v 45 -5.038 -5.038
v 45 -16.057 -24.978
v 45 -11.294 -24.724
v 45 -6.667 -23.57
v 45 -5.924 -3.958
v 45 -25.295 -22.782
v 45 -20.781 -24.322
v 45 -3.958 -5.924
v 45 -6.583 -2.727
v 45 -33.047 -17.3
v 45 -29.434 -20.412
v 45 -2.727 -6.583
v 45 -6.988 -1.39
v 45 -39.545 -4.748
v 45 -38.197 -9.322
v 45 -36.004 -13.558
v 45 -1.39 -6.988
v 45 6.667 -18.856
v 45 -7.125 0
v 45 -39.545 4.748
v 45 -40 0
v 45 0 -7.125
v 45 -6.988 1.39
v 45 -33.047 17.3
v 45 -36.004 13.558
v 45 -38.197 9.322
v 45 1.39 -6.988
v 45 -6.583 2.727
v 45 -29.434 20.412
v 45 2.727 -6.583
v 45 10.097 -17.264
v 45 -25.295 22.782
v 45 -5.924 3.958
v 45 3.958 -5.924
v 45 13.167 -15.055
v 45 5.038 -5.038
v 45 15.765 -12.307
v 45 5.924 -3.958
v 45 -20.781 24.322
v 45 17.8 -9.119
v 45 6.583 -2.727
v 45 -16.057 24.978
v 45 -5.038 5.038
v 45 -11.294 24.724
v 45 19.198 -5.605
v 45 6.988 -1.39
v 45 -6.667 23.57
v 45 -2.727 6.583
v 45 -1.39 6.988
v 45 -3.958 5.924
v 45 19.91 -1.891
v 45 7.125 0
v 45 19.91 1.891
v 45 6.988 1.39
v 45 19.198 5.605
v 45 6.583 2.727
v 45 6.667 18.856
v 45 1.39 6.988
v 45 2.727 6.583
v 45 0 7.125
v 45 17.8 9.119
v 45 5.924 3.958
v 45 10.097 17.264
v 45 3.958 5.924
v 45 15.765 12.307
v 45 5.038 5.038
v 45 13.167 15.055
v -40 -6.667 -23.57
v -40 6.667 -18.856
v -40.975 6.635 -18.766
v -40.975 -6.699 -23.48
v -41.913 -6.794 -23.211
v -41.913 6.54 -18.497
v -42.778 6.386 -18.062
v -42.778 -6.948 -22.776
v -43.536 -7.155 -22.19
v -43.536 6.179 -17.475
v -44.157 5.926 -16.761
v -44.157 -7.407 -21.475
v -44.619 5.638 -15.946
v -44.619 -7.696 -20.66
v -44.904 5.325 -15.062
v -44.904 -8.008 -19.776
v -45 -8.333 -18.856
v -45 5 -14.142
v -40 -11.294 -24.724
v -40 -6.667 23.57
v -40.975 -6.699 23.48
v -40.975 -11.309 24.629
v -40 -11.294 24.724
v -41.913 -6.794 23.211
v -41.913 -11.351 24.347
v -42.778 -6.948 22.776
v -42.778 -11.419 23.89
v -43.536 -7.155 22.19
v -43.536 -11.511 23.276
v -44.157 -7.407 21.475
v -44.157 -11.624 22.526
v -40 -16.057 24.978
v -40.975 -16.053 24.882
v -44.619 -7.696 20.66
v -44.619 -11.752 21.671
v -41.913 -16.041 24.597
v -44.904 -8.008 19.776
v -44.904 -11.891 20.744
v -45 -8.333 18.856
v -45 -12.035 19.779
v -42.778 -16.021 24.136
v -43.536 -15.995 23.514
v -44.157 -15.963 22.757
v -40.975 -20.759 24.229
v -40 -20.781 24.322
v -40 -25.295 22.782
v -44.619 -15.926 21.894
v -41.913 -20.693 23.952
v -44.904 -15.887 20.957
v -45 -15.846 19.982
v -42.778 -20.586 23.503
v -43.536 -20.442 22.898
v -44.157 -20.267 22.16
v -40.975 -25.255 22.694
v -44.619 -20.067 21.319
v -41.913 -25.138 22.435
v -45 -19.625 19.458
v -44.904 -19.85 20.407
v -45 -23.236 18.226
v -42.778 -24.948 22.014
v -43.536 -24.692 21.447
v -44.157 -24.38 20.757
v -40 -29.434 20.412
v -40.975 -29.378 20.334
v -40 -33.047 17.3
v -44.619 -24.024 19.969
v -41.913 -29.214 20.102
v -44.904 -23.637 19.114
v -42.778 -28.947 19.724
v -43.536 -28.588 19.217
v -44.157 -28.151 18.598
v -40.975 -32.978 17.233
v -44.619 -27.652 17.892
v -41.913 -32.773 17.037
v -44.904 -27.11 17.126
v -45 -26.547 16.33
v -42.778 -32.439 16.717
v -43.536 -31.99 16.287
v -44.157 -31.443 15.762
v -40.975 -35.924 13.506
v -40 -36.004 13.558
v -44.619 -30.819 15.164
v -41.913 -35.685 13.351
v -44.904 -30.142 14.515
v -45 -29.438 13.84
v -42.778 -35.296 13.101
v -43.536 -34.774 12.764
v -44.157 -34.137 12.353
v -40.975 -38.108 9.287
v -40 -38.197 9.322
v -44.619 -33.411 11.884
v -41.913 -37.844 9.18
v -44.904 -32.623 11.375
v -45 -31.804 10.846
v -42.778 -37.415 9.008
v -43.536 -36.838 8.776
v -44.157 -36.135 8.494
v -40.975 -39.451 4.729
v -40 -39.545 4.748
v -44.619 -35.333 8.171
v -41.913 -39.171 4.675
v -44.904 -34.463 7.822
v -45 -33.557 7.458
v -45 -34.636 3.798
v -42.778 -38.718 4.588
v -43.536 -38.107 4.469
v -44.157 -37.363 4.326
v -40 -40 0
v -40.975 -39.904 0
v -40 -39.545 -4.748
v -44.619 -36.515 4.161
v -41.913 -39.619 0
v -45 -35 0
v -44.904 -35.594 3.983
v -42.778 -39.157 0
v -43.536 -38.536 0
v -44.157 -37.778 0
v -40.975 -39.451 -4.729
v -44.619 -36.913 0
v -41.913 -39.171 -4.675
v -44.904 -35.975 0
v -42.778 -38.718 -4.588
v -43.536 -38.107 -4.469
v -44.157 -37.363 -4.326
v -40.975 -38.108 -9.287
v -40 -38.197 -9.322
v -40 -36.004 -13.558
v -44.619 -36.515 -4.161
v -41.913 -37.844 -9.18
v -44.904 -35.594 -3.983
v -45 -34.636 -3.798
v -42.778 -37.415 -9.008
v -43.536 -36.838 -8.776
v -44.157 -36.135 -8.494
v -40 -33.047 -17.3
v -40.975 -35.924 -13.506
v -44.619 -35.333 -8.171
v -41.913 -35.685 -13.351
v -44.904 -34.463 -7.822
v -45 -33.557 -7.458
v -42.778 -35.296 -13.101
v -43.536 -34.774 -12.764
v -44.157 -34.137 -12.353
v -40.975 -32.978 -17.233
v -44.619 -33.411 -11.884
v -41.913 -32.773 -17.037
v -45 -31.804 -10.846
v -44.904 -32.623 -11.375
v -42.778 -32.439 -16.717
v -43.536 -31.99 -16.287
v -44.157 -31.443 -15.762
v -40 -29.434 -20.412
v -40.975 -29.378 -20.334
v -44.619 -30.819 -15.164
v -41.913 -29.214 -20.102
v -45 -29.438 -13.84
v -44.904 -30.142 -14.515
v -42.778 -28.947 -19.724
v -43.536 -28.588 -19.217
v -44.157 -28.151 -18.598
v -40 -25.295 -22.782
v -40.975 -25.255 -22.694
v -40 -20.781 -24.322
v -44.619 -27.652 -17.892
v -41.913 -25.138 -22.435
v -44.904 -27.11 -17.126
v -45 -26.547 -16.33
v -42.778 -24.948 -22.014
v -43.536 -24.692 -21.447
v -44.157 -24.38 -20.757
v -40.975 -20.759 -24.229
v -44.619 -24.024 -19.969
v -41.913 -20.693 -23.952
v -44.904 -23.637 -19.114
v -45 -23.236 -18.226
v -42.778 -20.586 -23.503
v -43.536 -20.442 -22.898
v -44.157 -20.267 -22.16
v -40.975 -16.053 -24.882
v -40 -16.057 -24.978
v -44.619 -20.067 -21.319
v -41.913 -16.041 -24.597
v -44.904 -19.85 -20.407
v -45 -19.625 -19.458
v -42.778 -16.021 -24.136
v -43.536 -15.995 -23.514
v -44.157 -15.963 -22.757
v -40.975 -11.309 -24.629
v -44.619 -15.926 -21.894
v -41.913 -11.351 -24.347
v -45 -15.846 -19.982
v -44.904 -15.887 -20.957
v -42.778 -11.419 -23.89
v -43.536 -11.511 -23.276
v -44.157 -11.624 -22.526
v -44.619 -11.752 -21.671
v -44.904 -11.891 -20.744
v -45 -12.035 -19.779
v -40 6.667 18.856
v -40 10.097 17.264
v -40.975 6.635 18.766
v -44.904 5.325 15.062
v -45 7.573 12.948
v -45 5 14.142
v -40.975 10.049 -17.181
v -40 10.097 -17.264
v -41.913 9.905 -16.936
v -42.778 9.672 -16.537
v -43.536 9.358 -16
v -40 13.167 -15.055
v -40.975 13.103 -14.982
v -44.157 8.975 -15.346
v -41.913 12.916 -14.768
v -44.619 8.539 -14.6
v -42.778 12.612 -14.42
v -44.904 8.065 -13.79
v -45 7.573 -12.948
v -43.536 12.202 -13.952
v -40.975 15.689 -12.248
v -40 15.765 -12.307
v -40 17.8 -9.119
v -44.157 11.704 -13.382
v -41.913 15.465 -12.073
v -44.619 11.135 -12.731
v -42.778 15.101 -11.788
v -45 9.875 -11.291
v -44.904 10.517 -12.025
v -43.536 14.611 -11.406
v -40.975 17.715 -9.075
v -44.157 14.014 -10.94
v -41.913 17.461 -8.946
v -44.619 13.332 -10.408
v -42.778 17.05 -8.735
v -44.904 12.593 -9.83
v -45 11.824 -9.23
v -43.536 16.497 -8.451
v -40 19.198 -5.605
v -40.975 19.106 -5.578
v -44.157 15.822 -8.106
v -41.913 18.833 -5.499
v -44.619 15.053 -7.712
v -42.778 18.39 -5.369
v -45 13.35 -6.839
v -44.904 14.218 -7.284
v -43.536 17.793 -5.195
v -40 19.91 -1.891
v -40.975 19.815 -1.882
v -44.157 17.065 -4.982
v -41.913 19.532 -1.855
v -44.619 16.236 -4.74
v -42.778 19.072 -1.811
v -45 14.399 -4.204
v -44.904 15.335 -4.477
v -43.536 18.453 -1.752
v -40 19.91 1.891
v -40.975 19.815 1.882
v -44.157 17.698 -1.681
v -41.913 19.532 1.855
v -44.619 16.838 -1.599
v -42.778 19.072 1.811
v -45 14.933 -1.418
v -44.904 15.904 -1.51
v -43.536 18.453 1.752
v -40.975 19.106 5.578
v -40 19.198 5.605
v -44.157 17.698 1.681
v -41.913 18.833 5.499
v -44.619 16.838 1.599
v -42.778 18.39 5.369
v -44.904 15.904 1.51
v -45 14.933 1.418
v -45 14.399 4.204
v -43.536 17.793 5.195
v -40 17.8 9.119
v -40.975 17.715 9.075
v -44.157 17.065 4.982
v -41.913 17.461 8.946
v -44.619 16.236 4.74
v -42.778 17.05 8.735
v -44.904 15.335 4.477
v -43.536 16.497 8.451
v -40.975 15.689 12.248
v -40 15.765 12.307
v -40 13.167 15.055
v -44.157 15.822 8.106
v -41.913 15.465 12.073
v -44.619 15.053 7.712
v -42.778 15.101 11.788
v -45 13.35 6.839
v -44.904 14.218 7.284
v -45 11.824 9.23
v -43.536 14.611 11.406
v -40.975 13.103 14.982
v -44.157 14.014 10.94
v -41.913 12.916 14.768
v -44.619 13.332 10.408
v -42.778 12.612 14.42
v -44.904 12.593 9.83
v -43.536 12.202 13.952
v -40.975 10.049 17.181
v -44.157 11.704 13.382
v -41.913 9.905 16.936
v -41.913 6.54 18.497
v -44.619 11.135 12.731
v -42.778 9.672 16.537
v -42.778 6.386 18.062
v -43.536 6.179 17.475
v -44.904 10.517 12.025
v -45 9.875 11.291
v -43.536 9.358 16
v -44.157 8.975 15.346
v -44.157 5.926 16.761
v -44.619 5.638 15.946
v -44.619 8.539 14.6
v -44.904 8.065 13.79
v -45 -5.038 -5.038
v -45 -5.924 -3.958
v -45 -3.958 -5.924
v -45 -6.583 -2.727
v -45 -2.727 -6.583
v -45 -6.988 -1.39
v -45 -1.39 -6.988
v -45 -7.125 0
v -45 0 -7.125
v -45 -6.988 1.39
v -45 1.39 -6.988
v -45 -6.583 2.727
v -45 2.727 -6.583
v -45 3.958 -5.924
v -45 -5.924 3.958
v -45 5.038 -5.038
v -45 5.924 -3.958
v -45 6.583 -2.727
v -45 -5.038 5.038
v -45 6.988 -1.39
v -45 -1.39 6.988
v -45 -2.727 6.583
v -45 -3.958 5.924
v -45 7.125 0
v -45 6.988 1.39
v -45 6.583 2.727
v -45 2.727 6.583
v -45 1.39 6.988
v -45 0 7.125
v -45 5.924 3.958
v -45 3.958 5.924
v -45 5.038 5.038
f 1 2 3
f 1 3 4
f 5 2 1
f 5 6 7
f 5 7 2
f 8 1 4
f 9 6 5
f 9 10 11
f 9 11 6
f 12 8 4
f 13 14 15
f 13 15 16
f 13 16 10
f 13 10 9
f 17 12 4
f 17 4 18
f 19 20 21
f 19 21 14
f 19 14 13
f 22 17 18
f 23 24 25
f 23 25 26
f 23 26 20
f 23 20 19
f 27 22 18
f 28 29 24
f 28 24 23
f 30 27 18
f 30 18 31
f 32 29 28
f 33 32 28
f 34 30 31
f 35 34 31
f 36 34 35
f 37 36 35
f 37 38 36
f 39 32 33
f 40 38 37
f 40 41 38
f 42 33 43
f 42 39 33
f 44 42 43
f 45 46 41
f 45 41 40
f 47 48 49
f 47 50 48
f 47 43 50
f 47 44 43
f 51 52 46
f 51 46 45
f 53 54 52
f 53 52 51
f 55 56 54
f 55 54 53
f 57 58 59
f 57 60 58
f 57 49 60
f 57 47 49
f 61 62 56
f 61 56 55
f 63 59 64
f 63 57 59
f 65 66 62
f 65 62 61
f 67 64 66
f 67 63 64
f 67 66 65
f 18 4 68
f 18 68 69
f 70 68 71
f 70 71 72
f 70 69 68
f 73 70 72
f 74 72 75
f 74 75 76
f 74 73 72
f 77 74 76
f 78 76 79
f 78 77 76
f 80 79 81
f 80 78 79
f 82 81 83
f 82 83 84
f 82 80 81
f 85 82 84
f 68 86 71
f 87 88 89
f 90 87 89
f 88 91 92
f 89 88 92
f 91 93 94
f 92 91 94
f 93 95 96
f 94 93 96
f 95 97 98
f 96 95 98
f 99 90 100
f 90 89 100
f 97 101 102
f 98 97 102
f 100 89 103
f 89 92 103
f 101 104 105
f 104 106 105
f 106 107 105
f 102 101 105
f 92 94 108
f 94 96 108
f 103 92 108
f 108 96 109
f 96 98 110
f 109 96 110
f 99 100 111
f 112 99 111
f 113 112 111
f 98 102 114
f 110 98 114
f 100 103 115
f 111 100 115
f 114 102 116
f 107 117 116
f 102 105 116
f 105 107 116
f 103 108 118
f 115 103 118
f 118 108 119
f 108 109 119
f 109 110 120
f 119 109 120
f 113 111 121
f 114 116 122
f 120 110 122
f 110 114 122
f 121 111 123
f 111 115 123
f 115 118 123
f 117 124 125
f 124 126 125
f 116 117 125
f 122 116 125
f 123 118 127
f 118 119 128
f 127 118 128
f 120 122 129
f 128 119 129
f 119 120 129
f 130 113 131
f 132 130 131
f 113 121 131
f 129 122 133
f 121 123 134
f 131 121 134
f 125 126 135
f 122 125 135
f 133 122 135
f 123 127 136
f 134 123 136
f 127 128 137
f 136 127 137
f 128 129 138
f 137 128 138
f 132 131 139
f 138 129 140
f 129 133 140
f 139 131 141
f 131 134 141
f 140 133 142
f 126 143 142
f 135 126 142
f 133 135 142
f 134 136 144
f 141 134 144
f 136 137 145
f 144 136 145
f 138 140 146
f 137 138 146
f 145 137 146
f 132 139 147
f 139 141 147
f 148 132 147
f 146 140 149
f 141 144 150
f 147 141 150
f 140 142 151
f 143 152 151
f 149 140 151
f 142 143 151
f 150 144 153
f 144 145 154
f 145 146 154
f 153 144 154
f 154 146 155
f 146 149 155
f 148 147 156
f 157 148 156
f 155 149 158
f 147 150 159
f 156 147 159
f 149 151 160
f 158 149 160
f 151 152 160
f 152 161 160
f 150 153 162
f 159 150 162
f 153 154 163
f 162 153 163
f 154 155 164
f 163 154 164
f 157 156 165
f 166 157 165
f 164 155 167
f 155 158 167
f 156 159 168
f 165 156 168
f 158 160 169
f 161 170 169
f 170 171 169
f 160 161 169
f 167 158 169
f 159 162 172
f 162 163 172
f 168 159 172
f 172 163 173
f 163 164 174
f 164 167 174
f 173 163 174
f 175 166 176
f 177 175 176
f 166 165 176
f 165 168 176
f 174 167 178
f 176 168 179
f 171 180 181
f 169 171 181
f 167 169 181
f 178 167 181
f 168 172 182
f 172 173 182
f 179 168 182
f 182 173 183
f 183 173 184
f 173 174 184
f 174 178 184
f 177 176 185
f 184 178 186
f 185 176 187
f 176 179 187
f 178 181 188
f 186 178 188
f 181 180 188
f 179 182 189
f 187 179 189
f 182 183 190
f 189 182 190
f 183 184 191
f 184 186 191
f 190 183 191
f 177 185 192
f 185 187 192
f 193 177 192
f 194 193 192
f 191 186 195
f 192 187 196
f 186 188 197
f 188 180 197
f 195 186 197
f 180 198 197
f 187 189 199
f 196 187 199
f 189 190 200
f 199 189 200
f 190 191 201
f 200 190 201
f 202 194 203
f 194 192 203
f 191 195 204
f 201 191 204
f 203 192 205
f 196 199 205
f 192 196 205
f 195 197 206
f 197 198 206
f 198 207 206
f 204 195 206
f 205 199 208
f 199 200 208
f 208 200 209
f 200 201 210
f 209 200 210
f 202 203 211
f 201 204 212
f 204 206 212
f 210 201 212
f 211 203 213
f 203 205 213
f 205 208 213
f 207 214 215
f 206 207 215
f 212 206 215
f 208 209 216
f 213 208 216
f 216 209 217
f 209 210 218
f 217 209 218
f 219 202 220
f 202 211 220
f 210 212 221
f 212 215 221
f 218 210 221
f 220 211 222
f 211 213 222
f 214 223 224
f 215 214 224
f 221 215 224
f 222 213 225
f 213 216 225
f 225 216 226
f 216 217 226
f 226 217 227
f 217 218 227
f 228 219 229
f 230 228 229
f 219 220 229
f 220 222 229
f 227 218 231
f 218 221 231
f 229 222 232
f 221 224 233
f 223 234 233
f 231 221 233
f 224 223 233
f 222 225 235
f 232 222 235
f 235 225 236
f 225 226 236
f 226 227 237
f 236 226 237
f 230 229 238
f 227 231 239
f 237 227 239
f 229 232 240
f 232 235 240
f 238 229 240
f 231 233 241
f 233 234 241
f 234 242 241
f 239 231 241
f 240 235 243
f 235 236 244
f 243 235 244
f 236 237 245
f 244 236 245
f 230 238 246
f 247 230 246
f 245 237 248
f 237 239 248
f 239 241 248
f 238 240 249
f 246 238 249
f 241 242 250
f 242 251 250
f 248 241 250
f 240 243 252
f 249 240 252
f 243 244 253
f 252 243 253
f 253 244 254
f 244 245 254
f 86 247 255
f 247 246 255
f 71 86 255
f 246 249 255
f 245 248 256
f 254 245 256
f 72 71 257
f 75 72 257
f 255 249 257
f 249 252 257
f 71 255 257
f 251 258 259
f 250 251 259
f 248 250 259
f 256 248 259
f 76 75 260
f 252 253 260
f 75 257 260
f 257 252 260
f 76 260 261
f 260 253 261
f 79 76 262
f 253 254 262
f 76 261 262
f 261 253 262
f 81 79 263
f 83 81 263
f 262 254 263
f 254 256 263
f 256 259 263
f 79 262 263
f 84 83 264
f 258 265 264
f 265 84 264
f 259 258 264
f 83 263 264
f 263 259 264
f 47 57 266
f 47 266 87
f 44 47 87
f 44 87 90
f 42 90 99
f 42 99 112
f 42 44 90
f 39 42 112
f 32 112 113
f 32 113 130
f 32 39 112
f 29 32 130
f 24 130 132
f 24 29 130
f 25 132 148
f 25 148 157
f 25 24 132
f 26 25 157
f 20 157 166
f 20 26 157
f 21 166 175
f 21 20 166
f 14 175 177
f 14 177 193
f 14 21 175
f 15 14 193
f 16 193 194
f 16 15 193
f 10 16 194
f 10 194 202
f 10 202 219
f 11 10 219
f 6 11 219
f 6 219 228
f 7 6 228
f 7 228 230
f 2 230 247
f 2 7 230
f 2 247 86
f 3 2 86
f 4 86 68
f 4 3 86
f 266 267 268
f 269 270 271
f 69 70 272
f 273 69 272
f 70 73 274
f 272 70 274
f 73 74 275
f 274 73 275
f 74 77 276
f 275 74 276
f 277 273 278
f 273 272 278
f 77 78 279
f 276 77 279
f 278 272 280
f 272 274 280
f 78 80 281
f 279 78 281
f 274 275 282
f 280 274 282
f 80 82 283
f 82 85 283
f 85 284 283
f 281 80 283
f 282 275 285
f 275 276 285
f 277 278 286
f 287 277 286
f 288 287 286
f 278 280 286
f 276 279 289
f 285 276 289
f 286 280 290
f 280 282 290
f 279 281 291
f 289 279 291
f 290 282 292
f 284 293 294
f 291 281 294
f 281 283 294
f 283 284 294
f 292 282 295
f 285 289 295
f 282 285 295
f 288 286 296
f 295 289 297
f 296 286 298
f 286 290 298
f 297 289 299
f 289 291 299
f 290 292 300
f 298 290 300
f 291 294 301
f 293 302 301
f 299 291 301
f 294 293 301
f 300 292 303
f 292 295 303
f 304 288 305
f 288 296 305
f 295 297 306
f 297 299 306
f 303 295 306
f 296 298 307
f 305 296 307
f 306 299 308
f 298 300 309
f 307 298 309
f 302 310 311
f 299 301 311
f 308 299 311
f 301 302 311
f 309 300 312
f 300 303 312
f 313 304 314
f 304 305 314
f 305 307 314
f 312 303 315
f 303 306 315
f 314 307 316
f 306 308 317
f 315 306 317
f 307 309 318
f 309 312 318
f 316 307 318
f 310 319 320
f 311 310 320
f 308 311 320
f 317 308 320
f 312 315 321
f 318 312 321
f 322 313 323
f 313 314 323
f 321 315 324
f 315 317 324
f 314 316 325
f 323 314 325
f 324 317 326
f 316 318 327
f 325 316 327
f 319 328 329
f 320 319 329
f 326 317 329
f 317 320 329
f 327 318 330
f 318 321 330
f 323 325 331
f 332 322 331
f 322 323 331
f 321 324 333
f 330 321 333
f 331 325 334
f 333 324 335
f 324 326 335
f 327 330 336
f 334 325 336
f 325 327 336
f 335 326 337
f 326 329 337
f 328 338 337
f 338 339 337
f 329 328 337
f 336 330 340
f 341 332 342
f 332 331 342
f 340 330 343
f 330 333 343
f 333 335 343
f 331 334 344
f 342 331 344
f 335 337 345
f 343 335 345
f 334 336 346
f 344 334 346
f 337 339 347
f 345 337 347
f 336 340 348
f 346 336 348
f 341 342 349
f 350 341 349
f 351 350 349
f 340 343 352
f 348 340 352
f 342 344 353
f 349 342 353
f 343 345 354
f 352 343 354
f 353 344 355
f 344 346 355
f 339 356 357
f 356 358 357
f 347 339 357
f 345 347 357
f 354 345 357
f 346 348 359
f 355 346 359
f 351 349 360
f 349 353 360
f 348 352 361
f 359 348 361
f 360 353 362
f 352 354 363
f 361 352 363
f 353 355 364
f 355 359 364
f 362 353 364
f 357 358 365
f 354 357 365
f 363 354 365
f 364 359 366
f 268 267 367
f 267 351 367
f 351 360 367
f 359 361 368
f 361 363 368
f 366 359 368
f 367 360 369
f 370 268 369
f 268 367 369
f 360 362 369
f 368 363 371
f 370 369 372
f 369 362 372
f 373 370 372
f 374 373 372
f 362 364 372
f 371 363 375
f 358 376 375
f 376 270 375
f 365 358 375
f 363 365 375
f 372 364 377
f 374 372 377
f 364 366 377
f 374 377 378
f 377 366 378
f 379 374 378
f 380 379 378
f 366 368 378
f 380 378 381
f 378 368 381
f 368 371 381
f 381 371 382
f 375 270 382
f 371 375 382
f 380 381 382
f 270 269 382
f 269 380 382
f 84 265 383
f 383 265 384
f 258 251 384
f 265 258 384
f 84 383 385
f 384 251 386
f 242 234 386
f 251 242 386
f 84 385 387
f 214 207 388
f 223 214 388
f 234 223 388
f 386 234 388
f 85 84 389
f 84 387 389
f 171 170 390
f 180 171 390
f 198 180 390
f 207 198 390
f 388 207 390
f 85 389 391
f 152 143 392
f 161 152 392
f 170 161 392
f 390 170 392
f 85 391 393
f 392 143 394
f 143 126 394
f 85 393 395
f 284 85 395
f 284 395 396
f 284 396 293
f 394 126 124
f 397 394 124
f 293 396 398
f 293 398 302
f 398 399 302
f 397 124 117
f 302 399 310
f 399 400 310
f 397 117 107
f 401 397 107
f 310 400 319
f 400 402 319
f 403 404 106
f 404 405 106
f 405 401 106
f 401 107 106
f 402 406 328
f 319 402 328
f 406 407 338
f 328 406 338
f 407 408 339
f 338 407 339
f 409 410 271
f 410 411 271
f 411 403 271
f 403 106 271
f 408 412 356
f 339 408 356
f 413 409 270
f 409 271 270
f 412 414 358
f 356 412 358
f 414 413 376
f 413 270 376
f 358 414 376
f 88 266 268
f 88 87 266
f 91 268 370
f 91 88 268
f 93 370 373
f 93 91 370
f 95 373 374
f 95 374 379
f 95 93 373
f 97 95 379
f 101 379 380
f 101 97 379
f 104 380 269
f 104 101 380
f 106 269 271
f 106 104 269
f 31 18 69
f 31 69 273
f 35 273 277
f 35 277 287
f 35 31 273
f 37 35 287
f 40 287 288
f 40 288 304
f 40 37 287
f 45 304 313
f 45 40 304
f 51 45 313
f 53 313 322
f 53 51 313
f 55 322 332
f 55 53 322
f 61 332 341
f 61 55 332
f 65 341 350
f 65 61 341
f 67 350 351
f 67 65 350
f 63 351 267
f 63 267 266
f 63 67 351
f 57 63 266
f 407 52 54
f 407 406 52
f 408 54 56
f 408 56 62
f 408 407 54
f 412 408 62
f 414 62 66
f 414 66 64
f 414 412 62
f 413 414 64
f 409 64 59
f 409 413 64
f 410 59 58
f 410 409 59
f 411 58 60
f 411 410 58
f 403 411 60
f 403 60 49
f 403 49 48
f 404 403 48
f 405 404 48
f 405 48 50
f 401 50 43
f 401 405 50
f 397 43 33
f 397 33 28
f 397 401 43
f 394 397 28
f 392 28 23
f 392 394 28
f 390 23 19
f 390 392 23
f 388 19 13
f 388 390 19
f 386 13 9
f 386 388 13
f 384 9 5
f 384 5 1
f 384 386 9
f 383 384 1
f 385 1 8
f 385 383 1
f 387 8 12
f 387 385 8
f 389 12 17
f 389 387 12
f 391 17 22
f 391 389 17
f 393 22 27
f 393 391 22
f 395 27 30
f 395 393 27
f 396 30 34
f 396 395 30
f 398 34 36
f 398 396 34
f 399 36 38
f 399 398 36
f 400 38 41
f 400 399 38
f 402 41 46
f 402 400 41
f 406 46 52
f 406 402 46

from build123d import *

# Parameters (mm, degrees)
F0_R     = 7.125
F1_DEPTH = 45
F2_R     = 5


with BuildPart() as f1:
    # F0 (on Right) → F1 (new body, symmetric)
    with BuildSketch(Plane.YZ):
        with BuildLine():
            Line((6.666667, 18.856181), (-6.666667, 23.570226))
            ThreePointArc((-6.666667, 23.570226), (-40, 0), (-6.666667, -23.570226))
            Line((-6.666667, -23.570226), (6.666667, -18.856181))
            ThreePointArc((6.666667, -18.856181), (20, 0), (6.666667, 18.856181))
        make_face()
        Circle(F0_R, mode=Mode.SUBTRACT)
    extrude(amount=F1_DEPTH, both=True)

    # F2
    f2_edges = [f1.edges().sort_by_distance(p)[0] for p in [
        (-45, -40, 0),
    ]]
    fillet(f2_edges, radius=F2_R)


solid = f1.part
